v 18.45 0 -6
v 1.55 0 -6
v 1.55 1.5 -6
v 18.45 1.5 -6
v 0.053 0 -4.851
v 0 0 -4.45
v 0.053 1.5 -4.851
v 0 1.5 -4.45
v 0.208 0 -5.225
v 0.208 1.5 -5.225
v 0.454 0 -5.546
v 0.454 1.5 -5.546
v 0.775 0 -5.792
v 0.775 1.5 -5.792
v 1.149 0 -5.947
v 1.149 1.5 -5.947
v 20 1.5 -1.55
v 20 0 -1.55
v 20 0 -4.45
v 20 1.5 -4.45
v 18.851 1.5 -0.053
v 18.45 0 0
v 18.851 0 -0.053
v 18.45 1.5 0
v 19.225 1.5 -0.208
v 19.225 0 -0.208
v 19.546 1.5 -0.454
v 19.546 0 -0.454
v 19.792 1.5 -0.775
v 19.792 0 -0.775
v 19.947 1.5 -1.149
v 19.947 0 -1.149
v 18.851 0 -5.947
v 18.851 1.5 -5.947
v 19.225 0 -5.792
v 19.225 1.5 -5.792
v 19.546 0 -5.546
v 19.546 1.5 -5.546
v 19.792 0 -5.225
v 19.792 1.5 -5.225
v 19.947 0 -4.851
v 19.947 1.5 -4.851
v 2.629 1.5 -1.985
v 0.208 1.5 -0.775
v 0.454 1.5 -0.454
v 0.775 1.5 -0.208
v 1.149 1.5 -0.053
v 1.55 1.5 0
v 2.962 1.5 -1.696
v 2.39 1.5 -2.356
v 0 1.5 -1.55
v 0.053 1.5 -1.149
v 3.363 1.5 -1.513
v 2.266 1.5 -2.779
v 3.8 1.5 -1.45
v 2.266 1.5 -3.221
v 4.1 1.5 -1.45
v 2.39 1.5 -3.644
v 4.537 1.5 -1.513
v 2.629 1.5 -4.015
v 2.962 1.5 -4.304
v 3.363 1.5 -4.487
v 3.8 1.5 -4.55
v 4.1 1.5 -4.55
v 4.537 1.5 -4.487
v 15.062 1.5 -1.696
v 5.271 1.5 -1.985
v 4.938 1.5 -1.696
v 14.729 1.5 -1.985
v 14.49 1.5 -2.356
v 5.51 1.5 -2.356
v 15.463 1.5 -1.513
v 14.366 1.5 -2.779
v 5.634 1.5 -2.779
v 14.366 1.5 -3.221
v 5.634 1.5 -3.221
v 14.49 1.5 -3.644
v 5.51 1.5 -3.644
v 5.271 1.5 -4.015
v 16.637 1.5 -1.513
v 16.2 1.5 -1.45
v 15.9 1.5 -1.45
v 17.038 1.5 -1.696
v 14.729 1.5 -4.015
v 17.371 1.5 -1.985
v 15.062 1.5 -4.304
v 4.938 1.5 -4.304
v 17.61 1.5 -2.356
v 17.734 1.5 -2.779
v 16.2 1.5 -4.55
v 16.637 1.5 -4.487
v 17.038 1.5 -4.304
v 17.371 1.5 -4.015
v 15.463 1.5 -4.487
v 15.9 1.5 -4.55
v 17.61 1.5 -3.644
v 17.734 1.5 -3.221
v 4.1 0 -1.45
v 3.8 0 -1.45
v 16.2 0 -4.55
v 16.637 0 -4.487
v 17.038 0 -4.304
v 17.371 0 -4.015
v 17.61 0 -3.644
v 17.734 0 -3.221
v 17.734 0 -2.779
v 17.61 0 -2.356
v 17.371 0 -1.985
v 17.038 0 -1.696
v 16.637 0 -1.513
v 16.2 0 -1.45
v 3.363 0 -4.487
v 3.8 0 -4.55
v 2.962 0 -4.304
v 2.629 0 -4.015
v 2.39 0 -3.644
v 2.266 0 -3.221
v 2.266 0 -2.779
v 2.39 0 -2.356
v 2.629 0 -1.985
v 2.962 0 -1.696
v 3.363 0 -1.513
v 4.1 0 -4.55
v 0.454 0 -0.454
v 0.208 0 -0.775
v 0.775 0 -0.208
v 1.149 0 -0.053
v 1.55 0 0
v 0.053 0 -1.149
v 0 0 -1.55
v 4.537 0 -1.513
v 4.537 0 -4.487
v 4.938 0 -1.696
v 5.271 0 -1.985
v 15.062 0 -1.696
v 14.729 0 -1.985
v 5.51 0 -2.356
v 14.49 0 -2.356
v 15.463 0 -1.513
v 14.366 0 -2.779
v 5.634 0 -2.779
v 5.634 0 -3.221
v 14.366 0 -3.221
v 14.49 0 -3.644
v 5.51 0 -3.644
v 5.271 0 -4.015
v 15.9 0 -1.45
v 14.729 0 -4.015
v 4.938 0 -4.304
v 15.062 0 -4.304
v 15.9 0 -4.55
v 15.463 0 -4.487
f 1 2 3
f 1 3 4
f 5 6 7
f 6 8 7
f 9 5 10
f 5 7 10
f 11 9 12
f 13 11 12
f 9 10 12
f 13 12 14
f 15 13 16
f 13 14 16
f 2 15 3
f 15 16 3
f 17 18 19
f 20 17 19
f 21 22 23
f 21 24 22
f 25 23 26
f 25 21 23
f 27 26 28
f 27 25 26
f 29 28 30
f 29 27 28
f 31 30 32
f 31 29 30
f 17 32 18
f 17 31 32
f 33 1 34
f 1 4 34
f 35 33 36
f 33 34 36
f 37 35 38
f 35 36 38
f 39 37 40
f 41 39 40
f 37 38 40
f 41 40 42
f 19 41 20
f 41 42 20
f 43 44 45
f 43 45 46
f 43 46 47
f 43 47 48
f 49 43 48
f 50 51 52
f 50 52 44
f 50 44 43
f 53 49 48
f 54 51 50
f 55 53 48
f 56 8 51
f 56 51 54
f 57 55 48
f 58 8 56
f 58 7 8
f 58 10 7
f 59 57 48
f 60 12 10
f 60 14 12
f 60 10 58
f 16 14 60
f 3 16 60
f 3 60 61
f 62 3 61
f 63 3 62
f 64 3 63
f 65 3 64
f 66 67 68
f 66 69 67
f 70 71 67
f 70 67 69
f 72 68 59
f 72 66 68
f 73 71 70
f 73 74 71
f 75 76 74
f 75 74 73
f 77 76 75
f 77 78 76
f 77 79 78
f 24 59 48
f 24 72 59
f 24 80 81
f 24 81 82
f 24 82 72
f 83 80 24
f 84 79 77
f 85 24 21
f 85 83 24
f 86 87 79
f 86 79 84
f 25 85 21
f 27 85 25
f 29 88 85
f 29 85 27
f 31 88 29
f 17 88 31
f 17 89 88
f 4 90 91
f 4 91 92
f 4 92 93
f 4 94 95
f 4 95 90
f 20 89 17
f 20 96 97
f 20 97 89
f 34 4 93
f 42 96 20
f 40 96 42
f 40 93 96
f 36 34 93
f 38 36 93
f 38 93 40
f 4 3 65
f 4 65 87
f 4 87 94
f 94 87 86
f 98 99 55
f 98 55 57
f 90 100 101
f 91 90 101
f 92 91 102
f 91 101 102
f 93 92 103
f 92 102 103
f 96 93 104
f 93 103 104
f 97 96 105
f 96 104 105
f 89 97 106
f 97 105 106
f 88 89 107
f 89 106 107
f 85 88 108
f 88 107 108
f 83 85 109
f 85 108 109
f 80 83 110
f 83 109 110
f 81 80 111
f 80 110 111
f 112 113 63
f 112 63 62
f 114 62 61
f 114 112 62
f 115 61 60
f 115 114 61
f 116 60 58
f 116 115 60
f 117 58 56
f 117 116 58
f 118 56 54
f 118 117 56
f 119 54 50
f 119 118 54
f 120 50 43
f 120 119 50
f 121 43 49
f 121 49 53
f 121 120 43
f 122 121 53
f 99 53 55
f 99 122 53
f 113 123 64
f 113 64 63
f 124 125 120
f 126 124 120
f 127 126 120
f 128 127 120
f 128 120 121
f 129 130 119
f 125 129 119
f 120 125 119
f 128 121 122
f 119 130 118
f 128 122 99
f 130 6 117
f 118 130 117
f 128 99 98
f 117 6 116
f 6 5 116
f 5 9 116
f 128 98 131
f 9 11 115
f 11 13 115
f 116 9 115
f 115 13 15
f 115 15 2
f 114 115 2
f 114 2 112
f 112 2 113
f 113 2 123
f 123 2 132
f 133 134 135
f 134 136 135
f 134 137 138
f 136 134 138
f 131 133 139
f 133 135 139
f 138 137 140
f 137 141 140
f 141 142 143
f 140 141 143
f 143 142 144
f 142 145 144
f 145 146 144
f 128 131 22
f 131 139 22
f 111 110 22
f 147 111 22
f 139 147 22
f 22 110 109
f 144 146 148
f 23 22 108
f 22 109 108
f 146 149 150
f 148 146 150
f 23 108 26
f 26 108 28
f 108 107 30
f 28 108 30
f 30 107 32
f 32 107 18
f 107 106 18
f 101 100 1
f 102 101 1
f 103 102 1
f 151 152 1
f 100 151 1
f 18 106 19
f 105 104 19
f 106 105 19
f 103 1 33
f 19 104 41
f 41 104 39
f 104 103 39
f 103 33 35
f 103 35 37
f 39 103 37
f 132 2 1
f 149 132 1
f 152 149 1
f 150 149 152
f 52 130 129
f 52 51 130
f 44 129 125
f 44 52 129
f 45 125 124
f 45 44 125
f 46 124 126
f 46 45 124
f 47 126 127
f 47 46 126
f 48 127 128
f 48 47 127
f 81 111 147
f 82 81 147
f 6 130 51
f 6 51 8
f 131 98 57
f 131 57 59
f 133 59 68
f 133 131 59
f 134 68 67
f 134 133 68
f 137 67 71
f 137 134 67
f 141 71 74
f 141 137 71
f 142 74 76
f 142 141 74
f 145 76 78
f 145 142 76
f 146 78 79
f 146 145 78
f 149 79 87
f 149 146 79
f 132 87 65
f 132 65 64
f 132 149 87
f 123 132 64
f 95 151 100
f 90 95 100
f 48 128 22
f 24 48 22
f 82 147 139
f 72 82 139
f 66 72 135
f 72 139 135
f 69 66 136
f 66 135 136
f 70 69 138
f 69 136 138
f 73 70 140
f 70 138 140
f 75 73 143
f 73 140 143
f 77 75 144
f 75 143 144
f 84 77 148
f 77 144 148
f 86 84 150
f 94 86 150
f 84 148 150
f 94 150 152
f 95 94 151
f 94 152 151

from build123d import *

# Parameters (mm, degrees)
SKETCH_1_W      = 20
SKETCH_1_H      = 6
EXTRUDE_1_DEPTH = 1.5
FILLET_1_R      = 1.55


with BuildPart() as part:
    # 草图1 → 凸台-拉伸1 (new body)
    with BuildSketch(Plane(origin=(0, 0, 0), x_dir=(1, 0, 0), z_dir=(0, 1, 0))):
        with Locations((10, 3)):
            Rectangle(SKETCH_1_W, SKETCH_1_H)
        with BuildLine():
            Line((16.2, 1.45), (15.9, 1.45))
            ThreePointArc((15.9, 1.45), (14.35, 3), (15.9, 4.55))
            Line((15.9, 4.55), (16.2, 4.55))
            ThreePointArc((16.2, 4.55), (17.75, 3), (16.2, 1.45))
        make_face(mode=Mode.SUBTRACT)
        with BuildLine():
            Line((3.8, 1.45), (4.1, 1.45))
            ThreePointArc((4.1, 1.45), (5.65, 3), (4.1, 4.55))
            Line((4.1, 4.55), (3.8, 4.55))
            ThreePointArc((3.8, 4.55), (2.25, 3), (3.8, 1.45))
        make_face(mode=Mode.SUBTRACT)
    extrude(amount=EXTRUDE_1_DEPTH)

    # 圆角1
    fillet_1_edges = [part.edges().sort_by_distance(p)[0] for p in [
        (0, 0.75, -6),
        (20, 0.75, -6),
        (20, 0.75, 0),
        (0, 0.75, 0),
    ]]
    fillet(fillet_1_edges, radius=FILLET_1_R)


solid = part.part
